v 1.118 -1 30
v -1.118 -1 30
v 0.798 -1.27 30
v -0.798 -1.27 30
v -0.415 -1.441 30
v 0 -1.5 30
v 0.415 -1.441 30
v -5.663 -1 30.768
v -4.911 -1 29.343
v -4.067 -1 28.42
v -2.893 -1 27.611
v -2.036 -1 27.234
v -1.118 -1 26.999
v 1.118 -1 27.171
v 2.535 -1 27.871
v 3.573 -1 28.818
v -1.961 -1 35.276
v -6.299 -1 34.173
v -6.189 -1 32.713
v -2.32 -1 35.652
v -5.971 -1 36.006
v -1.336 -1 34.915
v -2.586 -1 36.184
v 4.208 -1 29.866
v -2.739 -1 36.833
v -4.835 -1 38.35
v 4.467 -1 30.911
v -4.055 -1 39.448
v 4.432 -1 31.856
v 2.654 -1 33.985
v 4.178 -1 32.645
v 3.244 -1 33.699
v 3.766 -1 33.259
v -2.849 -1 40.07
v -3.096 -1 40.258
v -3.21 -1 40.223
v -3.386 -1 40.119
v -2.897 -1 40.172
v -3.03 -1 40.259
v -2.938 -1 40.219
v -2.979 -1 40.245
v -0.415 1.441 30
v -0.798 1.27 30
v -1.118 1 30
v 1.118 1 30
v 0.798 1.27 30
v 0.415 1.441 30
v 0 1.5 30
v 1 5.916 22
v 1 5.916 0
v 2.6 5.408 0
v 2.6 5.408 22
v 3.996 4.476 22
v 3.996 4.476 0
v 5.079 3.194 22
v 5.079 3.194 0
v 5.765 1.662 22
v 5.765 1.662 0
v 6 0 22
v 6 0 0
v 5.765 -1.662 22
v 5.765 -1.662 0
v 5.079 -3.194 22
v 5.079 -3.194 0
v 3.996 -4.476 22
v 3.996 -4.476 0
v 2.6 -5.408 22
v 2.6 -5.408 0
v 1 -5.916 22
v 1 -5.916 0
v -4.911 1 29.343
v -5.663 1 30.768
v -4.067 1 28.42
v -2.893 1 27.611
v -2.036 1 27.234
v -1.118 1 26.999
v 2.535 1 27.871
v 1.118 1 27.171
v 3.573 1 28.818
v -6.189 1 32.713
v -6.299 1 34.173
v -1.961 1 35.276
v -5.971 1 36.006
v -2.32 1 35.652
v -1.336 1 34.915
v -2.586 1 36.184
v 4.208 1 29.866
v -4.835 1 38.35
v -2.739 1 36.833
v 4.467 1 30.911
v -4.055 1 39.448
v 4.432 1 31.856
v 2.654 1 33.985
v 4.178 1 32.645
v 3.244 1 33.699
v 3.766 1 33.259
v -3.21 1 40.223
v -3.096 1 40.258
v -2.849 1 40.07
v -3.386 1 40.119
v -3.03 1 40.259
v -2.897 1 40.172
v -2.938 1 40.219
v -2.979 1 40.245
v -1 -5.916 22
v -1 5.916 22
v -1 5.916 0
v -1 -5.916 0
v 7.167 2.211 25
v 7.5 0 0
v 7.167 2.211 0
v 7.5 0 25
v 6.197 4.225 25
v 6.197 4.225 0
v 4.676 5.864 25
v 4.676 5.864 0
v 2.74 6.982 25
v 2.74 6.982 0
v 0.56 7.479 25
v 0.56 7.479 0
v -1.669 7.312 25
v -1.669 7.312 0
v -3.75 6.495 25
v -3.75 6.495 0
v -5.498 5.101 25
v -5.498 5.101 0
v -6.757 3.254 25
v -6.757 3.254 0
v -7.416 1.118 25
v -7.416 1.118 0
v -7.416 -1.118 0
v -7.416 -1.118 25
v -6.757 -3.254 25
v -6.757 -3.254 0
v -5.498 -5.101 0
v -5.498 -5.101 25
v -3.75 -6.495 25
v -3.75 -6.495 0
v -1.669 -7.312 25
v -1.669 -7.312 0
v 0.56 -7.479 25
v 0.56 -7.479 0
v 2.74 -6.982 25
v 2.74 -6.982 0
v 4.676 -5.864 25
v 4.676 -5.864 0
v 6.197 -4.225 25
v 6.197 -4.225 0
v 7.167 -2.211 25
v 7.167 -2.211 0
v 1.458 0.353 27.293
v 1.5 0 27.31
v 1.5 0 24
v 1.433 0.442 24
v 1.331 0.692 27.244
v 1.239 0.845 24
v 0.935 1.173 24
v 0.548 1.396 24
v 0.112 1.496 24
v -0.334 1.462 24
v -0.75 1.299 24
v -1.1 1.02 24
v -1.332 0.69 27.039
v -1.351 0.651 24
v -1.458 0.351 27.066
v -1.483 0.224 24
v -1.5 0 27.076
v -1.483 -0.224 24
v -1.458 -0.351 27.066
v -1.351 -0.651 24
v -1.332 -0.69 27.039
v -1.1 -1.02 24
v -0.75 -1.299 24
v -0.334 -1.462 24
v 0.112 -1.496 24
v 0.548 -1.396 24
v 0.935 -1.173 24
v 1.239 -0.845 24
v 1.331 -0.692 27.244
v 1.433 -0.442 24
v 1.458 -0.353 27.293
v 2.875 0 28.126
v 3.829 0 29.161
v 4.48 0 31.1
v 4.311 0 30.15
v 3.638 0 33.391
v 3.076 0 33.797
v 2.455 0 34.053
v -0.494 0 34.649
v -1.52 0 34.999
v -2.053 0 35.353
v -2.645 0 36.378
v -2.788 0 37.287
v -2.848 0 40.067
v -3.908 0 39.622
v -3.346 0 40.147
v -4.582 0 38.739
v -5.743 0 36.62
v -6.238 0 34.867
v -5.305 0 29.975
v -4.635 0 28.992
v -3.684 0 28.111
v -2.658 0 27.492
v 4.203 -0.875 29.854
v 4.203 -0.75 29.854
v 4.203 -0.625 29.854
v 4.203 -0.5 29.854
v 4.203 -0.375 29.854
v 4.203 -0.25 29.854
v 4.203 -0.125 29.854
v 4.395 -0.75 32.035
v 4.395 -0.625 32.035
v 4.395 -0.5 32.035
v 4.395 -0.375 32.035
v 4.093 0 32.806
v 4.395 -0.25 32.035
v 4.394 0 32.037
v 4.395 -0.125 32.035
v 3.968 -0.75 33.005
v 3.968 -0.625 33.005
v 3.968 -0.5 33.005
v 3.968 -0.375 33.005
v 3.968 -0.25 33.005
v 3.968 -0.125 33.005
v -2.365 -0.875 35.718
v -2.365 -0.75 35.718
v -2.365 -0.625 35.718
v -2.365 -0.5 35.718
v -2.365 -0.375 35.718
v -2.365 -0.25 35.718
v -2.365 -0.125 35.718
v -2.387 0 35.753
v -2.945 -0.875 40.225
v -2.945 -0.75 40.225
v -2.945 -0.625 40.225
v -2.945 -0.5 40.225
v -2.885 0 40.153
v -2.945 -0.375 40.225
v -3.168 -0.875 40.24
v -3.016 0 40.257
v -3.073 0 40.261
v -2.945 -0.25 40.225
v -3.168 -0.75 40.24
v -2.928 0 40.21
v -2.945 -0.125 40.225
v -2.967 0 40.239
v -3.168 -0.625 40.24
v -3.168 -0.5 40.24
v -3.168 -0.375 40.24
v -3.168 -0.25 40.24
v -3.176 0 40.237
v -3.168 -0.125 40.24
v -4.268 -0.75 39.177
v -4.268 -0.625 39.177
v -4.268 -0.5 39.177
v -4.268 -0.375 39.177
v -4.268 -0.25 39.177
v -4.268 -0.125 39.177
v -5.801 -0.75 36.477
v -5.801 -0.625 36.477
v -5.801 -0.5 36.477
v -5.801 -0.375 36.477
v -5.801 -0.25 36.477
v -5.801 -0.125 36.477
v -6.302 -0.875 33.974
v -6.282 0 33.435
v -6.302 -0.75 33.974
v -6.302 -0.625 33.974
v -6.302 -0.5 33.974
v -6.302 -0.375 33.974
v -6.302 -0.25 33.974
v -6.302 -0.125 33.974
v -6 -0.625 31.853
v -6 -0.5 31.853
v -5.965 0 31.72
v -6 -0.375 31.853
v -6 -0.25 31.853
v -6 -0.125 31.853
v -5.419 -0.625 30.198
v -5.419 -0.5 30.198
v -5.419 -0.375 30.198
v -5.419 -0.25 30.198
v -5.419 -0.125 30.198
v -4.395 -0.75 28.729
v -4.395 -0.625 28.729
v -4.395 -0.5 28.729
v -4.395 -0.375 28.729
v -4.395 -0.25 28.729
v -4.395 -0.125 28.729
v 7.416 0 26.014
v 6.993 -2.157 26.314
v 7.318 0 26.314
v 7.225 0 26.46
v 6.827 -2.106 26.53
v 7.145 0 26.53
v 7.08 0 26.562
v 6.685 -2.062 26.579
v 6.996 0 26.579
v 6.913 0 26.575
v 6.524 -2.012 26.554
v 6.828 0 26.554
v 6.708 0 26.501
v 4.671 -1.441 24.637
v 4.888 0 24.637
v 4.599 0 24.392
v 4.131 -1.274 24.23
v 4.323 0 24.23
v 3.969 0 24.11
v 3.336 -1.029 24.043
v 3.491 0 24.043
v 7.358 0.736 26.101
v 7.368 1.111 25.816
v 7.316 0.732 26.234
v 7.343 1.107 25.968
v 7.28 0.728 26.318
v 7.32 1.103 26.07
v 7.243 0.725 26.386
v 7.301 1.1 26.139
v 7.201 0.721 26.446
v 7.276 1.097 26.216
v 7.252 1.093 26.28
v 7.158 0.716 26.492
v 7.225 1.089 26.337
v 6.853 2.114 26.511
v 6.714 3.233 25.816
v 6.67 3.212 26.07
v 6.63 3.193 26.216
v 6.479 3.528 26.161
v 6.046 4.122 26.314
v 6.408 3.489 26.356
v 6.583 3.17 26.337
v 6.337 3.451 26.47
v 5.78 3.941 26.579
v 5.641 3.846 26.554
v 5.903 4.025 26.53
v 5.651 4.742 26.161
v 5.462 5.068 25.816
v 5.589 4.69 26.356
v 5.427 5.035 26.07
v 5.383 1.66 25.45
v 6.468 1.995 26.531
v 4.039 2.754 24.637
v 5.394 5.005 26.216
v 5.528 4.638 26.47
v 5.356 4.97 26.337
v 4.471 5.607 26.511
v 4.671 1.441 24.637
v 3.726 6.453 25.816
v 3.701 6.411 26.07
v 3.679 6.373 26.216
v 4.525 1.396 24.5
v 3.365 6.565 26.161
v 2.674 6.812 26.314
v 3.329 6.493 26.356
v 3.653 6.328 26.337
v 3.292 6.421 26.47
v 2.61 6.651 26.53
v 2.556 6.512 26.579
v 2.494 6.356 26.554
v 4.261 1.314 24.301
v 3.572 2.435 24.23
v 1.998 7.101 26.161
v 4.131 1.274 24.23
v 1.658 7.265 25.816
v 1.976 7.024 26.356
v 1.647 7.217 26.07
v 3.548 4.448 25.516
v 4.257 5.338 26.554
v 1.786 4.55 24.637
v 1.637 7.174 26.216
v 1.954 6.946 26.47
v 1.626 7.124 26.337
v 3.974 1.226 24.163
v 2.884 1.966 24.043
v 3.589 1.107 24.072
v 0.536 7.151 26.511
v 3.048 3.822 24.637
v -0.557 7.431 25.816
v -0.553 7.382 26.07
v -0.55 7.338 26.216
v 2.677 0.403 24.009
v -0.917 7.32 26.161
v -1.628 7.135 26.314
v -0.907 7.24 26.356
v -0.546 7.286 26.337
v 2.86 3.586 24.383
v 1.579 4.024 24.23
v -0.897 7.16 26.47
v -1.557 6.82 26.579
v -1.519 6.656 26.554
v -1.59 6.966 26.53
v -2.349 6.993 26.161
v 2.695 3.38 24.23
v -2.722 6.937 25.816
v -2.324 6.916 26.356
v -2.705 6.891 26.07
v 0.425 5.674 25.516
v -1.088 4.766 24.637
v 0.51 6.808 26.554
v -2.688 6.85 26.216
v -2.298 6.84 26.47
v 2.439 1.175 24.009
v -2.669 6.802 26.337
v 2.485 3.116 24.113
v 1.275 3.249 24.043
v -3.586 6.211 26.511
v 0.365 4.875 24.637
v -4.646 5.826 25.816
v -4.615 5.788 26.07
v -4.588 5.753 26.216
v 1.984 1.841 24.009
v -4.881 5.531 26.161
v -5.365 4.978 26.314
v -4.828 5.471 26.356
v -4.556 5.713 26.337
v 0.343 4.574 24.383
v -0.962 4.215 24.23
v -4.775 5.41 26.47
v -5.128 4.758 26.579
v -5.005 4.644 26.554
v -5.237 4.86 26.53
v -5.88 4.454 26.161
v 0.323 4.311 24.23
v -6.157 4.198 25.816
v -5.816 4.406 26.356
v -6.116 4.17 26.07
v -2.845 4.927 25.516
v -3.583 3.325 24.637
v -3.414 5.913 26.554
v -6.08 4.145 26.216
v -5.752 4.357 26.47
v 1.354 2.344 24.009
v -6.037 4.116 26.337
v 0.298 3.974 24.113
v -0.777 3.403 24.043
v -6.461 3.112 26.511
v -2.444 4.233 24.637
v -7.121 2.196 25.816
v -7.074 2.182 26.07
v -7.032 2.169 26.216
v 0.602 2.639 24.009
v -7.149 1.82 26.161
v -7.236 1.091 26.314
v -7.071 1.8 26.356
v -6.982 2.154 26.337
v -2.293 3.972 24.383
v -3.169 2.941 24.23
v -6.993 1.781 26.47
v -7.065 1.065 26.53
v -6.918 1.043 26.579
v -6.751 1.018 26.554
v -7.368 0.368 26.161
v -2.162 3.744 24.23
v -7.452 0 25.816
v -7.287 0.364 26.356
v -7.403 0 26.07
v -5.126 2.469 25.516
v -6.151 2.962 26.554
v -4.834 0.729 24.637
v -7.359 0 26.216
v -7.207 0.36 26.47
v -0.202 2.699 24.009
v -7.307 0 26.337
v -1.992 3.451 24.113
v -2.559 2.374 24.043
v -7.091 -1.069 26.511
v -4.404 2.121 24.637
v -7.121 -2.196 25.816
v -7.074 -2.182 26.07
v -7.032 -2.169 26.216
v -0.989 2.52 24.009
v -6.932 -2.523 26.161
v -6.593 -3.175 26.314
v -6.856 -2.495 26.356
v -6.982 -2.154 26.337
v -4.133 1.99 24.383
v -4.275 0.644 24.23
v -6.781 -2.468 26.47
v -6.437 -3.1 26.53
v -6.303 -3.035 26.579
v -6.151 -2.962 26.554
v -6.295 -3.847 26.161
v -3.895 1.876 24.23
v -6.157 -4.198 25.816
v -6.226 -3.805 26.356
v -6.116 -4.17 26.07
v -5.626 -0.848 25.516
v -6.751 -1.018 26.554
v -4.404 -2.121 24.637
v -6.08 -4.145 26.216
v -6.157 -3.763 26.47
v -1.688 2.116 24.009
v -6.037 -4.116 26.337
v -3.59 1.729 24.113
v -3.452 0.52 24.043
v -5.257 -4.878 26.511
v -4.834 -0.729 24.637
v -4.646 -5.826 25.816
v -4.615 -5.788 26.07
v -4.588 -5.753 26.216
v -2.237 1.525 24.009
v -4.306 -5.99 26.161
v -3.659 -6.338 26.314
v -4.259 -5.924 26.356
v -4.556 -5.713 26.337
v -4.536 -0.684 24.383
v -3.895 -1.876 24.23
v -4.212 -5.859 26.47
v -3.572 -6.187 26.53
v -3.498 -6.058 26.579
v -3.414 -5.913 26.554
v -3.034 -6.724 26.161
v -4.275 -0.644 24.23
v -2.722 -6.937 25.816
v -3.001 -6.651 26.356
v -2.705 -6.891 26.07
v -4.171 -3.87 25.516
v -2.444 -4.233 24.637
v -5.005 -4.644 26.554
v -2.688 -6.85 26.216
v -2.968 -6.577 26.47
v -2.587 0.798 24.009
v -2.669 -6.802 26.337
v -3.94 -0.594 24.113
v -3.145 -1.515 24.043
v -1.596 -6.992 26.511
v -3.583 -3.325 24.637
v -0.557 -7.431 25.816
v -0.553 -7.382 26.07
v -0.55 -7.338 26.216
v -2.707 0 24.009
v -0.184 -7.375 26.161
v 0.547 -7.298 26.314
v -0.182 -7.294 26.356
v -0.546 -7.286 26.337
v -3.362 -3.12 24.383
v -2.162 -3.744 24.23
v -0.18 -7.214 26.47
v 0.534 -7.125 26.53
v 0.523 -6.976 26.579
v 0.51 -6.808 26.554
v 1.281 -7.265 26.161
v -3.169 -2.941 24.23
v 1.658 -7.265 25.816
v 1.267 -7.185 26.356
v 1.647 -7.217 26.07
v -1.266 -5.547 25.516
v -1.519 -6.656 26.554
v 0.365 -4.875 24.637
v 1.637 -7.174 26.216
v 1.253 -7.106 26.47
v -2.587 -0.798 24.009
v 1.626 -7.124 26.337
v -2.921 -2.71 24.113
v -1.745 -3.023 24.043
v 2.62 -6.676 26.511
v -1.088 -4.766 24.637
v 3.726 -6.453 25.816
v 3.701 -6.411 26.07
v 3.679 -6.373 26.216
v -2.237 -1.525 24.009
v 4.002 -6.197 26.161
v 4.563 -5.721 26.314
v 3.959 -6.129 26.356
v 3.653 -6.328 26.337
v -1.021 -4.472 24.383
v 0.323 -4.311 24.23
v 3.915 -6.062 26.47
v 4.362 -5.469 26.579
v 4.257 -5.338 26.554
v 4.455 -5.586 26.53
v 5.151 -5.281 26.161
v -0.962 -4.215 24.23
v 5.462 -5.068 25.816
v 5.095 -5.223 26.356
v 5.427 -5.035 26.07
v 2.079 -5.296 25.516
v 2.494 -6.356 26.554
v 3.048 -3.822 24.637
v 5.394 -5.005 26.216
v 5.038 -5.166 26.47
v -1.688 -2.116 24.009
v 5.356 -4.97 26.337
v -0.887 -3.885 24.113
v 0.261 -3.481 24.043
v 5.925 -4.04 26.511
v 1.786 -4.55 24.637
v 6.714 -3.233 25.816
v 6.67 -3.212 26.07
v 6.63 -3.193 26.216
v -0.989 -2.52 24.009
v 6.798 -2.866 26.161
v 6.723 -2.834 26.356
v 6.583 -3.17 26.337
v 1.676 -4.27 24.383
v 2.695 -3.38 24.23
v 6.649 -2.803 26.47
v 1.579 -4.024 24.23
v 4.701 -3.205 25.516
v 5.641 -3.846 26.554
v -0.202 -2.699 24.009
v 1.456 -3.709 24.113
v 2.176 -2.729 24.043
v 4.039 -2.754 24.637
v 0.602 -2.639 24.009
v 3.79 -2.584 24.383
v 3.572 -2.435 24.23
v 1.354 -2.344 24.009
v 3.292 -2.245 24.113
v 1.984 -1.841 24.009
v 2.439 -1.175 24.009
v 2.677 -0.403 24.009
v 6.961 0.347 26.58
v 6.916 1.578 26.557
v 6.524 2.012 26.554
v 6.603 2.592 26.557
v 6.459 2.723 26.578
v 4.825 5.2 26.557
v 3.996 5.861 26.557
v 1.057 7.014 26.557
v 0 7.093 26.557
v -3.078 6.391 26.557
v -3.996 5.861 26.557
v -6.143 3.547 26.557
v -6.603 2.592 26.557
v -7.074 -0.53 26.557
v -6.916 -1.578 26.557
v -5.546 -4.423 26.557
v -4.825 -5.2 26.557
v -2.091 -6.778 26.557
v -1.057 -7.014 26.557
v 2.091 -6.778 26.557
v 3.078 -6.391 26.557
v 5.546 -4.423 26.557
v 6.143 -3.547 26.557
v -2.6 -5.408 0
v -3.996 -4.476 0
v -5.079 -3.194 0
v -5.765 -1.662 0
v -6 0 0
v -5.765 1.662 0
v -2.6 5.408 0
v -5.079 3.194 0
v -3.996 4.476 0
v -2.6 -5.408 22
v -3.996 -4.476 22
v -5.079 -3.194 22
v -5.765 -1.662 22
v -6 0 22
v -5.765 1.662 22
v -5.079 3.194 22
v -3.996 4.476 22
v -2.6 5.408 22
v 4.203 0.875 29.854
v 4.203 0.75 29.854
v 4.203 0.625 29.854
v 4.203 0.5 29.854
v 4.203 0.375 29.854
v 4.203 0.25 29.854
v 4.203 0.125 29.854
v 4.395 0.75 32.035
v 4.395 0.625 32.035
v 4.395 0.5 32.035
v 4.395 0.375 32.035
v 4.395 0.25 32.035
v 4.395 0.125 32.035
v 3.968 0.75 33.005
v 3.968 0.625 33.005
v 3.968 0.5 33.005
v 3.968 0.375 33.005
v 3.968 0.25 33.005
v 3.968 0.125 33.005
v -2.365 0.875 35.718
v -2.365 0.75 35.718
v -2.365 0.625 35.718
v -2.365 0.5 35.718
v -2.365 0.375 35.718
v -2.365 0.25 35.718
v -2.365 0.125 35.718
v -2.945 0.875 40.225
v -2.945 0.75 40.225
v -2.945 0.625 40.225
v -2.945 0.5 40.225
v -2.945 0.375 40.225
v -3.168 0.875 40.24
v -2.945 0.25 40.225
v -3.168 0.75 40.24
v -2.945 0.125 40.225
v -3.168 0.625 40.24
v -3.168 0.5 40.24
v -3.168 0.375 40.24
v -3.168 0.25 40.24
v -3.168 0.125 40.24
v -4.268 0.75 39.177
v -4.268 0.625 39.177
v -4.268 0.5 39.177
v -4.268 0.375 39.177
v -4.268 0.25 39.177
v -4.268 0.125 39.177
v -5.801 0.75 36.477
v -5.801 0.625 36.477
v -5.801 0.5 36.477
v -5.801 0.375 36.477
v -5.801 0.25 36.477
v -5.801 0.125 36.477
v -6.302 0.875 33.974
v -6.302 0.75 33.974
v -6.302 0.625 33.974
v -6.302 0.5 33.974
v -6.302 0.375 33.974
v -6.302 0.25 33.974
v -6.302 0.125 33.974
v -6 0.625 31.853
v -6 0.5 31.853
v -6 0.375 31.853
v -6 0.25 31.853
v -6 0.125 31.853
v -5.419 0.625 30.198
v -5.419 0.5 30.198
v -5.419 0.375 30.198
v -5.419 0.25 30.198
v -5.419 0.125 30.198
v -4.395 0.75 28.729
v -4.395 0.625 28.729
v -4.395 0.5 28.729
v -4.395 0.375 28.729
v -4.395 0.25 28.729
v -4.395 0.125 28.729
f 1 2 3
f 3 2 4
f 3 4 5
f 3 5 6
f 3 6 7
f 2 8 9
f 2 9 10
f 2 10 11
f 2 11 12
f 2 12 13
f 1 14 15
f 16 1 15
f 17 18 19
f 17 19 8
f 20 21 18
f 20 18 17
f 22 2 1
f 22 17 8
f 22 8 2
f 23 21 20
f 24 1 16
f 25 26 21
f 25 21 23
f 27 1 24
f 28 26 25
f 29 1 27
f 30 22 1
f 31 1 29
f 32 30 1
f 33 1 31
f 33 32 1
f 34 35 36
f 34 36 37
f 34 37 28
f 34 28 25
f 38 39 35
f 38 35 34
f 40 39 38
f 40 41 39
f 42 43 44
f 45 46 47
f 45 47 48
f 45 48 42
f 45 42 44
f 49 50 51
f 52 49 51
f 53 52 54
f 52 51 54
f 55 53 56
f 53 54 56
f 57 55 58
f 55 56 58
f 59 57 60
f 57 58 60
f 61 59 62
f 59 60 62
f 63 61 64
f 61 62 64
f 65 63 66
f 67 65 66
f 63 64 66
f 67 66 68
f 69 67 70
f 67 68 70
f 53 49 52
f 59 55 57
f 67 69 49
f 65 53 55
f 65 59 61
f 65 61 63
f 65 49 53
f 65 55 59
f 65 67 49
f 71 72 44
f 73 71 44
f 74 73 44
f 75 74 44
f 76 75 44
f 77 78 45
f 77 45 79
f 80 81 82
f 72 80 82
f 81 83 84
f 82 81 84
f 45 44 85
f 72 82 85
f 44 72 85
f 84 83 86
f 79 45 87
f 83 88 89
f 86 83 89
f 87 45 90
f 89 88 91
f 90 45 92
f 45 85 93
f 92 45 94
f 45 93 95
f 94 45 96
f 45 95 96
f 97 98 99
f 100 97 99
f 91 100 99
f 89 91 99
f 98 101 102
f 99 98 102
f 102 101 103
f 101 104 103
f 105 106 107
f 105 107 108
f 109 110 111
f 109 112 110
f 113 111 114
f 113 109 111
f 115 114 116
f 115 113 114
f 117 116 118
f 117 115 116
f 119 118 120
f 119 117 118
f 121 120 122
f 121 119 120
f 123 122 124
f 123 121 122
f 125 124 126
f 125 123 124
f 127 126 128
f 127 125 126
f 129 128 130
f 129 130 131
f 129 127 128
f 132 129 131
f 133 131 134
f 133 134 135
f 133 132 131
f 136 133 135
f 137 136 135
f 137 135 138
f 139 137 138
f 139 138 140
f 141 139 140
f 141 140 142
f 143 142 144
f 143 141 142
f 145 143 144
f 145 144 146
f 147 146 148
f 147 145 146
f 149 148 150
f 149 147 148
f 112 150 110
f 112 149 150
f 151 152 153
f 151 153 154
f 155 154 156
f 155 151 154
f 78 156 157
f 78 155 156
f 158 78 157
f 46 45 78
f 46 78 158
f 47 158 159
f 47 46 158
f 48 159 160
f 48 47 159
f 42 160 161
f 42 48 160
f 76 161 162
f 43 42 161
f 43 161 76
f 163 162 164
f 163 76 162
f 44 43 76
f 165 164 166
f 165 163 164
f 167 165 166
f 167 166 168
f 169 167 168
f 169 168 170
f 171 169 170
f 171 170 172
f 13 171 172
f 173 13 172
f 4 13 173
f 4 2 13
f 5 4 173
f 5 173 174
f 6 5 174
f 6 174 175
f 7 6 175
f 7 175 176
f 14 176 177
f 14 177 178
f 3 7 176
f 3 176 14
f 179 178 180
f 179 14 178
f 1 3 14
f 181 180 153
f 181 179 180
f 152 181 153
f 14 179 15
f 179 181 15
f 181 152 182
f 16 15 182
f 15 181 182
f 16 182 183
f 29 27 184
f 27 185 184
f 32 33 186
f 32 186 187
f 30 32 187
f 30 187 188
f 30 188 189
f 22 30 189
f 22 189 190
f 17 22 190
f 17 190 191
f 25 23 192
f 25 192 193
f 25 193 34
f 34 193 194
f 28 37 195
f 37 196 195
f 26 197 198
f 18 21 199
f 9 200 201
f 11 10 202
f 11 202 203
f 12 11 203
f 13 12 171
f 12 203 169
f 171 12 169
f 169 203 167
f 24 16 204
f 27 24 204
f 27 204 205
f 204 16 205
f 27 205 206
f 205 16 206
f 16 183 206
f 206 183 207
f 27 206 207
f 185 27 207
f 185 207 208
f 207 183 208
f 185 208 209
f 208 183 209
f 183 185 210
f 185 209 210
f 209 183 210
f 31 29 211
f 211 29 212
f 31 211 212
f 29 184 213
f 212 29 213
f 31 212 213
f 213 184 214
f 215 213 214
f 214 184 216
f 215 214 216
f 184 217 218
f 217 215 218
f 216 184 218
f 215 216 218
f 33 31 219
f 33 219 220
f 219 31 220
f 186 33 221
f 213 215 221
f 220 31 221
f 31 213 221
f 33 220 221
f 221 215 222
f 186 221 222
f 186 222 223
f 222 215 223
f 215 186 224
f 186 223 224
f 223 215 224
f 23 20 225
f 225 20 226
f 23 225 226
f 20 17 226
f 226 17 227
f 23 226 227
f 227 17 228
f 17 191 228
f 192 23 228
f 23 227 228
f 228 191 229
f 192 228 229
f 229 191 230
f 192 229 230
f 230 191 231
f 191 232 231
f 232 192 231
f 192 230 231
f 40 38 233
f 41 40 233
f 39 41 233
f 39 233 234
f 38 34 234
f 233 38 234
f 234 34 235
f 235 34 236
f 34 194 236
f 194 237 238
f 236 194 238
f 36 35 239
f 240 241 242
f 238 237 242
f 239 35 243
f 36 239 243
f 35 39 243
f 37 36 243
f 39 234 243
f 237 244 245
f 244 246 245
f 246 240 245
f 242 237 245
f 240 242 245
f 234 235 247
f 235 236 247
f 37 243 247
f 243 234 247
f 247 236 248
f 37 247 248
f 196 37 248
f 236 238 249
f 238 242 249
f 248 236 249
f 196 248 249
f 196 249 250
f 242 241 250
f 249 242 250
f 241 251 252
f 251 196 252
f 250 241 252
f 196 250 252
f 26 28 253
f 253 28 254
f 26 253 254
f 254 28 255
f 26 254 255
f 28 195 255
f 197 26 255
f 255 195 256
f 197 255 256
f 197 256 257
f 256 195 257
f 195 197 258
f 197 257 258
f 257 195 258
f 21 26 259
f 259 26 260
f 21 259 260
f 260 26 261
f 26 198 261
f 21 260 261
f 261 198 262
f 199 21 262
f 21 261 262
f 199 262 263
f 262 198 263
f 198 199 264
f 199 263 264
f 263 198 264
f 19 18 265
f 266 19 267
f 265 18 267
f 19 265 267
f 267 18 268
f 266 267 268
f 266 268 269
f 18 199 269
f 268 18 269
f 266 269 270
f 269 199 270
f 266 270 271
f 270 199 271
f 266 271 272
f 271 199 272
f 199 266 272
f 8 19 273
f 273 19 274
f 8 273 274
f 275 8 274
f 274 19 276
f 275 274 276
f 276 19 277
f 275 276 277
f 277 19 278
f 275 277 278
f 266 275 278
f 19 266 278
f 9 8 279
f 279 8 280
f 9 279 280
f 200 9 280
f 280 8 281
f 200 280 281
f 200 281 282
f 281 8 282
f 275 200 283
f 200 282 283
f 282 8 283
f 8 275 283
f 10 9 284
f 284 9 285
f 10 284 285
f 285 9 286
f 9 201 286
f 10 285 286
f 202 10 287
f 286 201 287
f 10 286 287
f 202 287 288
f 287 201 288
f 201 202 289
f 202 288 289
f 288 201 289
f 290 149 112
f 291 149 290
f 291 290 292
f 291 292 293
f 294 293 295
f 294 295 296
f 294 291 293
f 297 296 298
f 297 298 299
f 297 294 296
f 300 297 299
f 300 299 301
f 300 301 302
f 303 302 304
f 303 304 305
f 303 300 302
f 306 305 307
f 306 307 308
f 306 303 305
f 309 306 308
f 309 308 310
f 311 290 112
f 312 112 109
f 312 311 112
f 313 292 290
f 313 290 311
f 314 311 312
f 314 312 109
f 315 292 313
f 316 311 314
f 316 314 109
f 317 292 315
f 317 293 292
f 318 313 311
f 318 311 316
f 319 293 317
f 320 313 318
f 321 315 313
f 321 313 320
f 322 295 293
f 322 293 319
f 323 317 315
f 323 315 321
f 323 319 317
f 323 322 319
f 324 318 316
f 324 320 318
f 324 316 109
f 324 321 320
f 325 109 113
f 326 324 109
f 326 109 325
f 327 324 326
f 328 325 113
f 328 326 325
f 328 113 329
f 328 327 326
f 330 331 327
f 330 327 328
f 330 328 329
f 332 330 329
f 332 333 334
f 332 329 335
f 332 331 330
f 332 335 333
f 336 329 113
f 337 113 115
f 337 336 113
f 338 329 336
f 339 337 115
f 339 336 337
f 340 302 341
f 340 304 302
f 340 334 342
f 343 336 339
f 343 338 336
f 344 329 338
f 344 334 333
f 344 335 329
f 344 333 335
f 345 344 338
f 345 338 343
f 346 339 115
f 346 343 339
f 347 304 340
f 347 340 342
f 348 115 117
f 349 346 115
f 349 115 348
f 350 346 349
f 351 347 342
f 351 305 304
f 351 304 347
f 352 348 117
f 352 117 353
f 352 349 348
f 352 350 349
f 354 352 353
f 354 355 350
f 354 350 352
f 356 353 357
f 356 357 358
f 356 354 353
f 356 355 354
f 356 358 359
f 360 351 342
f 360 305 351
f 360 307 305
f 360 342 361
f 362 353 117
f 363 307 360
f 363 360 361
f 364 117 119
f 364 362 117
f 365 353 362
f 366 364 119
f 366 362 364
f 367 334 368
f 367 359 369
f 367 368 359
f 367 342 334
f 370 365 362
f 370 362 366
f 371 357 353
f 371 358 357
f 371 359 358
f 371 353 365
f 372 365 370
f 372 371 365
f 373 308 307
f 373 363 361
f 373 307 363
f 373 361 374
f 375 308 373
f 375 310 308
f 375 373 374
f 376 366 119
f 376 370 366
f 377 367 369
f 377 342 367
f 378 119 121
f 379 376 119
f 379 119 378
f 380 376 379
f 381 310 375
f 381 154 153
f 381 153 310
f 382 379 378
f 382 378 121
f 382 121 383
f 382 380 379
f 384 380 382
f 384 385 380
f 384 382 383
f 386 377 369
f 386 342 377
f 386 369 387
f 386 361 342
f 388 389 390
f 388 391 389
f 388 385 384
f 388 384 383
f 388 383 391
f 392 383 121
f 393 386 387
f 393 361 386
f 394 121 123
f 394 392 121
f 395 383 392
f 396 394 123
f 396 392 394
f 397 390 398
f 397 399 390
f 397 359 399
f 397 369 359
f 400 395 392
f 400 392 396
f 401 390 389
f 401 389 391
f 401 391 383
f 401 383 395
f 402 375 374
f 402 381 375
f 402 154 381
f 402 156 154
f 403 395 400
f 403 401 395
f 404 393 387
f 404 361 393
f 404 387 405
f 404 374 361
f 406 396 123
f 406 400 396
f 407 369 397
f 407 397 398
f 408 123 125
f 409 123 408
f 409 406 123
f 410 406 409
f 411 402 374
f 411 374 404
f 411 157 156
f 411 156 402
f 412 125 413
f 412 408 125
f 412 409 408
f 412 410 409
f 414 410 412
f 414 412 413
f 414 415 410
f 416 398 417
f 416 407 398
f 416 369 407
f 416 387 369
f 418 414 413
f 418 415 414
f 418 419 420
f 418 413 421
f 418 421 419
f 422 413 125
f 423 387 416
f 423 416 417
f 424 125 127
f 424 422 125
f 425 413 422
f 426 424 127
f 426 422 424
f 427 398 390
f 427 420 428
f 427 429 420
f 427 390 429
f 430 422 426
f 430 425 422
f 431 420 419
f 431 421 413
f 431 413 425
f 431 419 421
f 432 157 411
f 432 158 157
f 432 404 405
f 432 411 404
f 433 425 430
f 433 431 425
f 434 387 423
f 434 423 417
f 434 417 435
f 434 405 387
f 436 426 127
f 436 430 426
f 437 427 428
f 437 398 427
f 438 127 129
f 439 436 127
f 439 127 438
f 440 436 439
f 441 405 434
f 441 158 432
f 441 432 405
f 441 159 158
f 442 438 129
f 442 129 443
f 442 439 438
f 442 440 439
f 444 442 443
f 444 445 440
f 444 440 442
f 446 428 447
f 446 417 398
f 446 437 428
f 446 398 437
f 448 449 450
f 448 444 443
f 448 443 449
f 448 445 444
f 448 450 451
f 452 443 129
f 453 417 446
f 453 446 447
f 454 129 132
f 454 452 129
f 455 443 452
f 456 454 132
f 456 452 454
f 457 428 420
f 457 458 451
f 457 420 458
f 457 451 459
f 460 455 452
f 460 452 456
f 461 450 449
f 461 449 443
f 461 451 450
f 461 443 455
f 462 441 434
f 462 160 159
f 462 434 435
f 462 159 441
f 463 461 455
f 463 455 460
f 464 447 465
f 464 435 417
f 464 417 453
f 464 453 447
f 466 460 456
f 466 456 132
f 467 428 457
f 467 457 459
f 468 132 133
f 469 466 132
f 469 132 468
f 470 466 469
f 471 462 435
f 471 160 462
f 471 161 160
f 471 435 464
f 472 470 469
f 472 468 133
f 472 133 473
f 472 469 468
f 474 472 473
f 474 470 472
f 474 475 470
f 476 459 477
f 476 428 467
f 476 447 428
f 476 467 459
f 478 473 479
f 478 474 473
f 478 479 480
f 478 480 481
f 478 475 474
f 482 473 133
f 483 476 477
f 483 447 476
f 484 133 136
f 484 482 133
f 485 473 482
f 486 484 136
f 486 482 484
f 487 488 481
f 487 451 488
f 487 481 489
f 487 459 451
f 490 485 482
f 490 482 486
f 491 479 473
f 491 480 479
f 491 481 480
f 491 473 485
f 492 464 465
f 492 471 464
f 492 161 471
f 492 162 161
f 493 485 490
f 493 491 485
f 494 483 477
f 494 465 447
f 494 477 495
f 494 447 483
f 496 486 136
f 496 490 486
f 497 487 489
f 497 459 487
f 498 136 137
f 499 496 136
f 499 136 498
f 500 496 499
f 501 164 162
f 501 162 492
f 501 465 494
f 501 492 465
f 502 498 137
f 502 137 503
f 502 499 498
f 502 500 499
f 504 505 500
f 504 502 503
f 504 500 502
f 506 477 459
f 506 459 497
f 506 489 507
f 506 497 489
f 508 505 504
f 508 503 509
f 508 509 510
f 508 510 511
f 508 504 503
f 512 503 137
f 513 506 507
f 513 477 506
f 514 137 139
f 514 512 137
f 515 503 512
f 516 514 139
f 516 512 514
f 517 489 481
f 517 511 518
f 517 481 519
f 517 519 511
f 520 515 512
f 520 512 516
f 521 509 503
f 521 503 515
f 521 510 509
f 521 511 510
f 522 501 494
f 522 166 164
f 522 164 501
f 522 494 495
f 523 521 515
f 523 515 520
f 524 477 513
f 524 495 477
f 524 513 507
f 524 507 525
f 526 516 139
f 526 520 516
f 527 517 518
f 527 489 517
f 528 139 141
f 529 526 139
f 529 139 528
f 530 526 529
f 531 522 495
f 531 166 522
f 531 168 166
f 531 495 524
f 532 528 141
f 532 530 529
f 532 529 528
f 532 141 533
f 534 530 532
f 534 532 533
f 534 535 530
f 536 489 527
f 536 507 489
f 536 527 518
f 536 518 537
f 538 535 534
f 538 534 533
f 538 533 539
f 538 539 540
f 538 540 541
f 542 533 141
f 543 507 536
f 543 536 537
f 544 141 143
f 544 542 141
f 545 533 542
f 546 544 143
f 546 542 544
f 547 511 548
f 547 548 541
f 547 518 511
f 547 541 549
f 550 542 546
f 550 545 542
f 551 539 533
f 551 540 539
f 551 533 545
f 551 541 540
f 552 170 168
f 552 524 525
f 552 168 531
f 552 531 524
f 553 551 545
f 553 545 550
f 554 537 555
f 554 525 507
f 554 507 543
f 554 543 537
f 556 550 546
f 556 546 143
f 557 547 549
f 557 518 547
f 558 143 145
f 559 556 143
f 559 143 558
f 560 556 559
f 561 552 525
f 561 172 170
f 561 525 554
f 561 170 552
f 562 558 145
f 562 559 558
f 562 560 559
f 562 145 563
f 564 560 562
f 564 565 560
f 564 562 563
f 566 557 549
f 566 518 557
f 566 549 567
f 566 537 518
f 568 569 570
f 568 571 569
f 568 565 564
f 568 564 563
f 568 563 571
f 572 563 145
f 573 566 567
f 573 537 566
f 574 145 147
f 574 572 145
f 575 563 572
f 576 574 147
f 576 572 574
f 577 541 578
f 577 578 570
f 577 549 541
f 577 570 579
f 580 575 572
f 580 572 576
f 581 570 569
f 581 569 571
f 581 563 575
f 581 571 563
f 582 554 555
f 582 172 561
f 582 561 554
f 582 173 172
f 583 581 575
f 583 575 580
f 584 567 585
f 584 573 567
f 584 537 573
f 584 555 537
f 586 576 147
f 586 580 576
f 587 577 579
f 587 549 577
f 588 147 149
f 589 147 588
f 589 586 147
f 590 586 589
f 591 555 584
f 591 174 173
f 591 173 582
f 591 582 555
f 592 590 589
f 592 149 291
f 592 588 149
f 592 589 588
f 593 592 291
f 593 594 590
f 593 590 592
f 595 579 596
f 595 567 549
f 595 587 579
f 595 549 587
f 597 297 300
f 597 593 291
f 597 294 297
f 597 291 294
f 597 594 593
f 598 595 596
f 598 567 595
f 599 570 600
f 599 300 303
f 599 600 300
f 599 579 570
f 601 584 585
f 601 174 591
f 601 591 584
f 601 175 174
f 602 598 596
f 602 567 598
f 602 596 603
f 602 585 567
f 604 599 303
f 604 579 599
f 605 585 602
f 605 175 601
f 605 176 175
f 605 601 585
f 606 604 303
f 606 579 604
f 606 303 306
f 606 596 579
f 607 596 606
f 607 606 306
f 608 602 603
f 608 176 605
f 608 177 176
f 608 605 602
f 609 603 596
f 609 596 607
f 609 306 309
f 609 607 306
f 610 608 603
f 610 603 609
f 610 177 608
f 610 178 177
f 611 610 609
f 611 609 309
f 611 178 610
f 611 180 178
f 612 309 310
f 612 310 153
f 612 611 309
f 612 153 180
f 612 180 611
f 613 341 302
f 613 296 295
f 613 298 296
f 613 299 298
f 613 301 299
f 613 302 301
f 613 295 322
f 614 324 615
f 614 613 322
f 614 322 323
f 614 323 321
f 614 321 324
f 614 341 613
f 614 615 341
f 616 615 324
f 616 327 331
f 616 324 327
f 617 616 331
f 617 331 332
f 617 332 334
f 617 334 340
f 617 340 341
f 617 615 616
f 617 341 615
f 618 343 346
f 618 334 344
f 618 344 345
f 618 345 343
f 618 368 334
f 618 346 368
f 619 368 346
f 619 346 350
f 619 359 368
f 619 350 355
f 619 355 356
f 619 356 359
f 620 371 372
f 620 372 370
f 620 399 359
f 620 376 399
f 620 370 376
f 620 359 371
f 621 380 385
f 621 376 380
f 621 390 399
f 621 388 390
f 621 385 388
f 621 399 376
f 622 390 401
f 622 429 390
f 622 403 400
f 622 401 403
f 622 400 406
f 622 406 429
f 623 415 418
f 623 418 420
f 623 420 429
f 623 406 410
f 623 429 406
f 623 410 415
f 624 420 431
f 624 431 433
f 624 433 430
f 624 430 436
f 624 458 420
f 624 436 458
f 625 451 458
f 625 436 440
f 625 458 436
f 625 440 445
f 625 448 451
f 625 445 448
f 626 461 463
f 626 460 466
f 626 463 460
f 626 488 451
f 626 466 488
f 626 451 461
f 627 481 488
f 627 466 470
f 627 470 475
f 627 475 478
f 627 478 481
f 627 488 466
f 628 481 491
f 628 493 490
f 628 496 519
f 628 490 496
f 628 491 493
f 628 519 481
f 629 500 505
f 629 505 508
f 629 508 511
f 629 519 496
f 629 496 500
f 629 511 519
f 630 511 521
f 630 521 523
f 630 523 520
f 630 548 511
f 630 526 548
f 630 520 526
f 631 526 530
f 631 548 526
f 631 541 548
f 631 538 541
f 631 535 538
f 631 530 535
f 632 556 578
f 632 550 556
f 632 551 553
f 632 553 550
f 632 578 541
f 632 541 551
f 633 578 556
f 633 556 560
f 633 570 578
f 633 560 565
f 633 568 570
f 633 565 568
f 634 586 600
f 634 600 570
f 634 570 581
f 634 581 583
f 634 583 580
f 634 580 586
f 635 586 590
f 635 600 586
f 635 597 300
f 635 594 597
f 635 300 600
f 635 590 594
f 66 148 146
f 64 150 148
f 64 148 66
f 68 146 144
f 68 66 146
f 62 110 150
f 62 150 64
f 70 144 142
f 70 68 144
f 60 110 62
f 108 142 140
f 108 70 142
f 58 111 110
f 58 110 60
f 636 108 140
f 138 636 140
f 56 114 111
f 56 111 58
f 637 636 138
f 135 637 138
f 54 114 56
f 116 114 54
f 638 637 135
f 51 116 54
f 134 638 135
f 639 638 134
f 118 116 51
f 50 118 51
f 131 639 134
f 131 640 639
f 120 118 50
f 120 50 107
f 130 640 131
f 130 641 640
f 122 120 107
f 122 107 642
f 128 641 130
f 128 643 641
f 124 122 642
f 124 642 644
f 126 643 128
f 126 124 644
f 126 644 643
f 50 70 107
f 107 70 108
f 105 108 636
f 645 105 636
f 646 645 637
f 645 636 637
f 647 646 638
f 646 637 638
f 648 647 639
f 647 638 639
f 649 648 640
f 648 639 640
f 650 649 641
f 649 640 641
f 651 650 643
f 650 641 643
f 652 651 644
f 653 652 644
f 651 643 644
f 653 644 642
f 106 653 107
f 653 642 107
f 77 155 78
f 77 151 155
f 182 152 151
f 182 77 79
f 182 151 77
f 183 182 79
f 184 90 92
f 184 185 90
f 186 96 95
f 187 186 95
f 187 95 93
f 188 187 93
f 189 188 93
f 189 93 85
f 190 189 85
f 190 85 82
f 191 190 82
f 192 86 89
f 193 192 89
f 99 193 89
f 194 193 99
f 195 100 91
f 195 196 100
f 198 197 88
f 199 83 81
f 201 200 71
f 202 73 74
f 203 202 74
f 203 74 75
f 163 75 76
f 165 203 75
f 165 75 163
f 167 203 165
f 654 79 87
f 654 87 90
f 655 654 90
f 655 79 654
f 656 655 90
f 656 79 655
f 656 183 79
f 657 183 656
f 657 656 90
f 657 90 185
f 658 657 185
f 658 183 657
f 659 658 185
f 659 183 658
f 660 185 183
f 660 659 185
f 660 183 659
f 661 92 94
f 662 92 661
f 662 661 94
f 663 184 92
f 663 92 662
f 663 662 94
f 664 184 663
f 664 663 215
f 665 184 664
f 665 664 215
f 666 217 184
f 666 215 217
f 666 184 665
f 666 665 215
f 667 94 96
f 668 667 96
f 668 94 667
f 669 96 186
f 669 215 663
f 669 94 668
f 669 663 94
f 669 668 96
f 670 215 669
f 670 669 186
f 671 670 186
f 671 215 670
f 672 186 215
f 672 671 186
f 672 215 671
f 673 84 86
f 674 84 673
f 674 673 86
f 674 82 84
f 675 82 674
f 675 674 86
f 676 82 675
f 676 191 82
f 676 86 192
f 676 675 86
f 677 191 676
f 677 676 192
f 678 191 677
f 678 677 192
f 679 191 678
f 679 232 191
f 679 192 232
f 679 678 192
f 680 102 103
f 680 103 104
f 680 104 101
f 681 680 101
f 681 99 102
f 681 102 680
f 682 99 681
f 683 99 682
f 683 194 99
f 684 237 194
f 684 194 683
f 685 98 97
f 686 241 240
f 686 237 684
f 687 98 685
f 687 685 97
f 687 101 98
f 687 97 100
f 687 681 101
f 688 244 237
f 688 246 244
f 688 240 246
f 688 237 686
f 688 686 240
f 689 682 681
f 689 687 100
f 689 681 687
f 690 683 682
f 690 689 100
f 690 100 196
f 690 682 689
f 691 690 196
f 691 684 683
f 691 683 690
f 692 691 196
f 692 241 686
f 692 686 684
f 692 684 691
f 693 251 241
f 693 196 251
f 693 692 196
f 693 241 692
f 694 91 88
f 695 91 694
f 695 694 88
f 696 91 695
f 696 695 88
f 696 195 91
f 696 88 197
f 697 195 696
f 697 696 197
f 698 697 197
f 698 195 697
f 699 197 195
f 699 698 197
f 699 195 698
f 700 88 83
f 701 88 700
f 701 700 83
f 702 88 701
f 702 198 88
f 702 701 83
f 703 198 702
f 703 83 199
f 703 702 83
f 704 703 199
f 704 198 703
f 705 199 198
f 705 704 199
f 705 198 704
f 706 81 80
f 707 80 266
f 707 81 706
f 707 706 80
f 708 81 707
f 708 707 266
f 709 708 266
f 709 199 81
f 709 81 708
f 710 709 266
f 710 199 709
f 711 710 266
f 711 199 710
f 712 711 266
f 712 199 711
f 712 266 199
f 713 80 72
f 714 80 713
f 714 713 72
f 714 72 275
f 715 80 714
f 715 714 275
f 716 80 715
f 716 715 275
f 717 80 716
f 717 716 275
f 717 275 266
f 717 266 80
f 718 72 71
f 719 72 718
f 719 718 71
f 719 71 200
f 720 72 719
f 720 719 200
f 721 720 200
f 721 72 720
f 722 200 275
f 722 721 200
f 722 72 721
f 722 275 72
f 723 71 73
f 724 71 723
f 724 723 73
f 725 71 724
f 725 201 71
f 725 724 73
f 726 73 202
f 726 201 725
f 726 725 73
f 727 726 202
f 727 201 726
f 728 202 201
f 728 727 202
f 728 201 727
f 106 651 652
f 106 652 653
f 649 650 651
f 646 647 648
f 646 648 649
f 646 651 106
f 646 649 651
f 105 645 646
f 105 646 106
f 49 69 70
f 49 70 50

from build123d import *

# Parameters (mm, degrees)
F3_DEPTH = 1
F5_DEPTH = 22


with BuildPart() as f1:
    # F0 (on Front) → F1 (revolve)
    with BuildSketch(Plane.XZ):
        with BuildLine():
            Line((0, 25), (0, 0))
            Line((0, 0), (7.5, 0))
            Line((7.5, 0), (7.5, 25))
            add(Edge.make_bspline(
                [(7.5, 25), (7.5, 27.7293550812), (5.2232004254, 24.8785987129), (4.2837052935, 24.0698828283), (3.4494399973, 24), (1.5, 24)],
                knots=[0, 0, 0, 0, 0.3159507046, 0.6176447617, 1, 1, 1, 1], degree=3))
            Line((1.5, 24), (1.5, 30))
            Line((1.5, 30), (0, 30))
            Line((0, 30), (0, 25))
        make_face()
    revolve(axis=Axis((0, 0, 12.5), (0, 0, 1)))

    # F2 (on Front) → F3 (join, symmetric)
    with BuildSketch(Plane.XZ):
        with BuildLine():
            add(Edge.make_bspline(
                [(0, 26.9477721304), (1.7591886985, 27.0805402808), (5.133113675, 29.3262695999), (4.0989089424, 35.0442071493), (-4.0371644112, 33.8093548315), (-1.7649166522, 42.7749614003), (-6.7165487463, 36.1095453311), (-6.1815955095, 31.9111091088), (-4.7972468562, 28.408081284), (-1.6946518044, 26.8198746593), (0, 26.9477721304)],
                knots=[0, 0, 0, 0, 0.1314530707, 0.2479856097, 0.3890972564, 0.5130554239, 0.63928719, 0.7643858297, 0.8733693642, 1, 1, 1, 1], degree=3))
        make_face()
    extrude(amount=F3_DEPTH, both=True)

    # F4 (on face) → F5 (cut)
    with BuildSketch(Plane(origin=(0, 0, 0), x_dir=(1, 0, 0), z_dir=(0, 0, -1))):
        with BuildLine():
            Line((-1, -5.9160797831), (-1, 5.9160797831))
            ThreePointArc((-1, 5.9160797831), (-6, 0), (-1, -5.9160797831))
        make_face()
        with BuildLine():
            ThreePointArc((1, -5.9160797831), (6, 0), (1, 5.9160797831))
            Line((1, 5.9160797831), (1, -5.9160797831))
        make_face()
    extrude(amount=-F5_DEPTH, mode=Mode.SUBTRACT)


solid = f1.part
